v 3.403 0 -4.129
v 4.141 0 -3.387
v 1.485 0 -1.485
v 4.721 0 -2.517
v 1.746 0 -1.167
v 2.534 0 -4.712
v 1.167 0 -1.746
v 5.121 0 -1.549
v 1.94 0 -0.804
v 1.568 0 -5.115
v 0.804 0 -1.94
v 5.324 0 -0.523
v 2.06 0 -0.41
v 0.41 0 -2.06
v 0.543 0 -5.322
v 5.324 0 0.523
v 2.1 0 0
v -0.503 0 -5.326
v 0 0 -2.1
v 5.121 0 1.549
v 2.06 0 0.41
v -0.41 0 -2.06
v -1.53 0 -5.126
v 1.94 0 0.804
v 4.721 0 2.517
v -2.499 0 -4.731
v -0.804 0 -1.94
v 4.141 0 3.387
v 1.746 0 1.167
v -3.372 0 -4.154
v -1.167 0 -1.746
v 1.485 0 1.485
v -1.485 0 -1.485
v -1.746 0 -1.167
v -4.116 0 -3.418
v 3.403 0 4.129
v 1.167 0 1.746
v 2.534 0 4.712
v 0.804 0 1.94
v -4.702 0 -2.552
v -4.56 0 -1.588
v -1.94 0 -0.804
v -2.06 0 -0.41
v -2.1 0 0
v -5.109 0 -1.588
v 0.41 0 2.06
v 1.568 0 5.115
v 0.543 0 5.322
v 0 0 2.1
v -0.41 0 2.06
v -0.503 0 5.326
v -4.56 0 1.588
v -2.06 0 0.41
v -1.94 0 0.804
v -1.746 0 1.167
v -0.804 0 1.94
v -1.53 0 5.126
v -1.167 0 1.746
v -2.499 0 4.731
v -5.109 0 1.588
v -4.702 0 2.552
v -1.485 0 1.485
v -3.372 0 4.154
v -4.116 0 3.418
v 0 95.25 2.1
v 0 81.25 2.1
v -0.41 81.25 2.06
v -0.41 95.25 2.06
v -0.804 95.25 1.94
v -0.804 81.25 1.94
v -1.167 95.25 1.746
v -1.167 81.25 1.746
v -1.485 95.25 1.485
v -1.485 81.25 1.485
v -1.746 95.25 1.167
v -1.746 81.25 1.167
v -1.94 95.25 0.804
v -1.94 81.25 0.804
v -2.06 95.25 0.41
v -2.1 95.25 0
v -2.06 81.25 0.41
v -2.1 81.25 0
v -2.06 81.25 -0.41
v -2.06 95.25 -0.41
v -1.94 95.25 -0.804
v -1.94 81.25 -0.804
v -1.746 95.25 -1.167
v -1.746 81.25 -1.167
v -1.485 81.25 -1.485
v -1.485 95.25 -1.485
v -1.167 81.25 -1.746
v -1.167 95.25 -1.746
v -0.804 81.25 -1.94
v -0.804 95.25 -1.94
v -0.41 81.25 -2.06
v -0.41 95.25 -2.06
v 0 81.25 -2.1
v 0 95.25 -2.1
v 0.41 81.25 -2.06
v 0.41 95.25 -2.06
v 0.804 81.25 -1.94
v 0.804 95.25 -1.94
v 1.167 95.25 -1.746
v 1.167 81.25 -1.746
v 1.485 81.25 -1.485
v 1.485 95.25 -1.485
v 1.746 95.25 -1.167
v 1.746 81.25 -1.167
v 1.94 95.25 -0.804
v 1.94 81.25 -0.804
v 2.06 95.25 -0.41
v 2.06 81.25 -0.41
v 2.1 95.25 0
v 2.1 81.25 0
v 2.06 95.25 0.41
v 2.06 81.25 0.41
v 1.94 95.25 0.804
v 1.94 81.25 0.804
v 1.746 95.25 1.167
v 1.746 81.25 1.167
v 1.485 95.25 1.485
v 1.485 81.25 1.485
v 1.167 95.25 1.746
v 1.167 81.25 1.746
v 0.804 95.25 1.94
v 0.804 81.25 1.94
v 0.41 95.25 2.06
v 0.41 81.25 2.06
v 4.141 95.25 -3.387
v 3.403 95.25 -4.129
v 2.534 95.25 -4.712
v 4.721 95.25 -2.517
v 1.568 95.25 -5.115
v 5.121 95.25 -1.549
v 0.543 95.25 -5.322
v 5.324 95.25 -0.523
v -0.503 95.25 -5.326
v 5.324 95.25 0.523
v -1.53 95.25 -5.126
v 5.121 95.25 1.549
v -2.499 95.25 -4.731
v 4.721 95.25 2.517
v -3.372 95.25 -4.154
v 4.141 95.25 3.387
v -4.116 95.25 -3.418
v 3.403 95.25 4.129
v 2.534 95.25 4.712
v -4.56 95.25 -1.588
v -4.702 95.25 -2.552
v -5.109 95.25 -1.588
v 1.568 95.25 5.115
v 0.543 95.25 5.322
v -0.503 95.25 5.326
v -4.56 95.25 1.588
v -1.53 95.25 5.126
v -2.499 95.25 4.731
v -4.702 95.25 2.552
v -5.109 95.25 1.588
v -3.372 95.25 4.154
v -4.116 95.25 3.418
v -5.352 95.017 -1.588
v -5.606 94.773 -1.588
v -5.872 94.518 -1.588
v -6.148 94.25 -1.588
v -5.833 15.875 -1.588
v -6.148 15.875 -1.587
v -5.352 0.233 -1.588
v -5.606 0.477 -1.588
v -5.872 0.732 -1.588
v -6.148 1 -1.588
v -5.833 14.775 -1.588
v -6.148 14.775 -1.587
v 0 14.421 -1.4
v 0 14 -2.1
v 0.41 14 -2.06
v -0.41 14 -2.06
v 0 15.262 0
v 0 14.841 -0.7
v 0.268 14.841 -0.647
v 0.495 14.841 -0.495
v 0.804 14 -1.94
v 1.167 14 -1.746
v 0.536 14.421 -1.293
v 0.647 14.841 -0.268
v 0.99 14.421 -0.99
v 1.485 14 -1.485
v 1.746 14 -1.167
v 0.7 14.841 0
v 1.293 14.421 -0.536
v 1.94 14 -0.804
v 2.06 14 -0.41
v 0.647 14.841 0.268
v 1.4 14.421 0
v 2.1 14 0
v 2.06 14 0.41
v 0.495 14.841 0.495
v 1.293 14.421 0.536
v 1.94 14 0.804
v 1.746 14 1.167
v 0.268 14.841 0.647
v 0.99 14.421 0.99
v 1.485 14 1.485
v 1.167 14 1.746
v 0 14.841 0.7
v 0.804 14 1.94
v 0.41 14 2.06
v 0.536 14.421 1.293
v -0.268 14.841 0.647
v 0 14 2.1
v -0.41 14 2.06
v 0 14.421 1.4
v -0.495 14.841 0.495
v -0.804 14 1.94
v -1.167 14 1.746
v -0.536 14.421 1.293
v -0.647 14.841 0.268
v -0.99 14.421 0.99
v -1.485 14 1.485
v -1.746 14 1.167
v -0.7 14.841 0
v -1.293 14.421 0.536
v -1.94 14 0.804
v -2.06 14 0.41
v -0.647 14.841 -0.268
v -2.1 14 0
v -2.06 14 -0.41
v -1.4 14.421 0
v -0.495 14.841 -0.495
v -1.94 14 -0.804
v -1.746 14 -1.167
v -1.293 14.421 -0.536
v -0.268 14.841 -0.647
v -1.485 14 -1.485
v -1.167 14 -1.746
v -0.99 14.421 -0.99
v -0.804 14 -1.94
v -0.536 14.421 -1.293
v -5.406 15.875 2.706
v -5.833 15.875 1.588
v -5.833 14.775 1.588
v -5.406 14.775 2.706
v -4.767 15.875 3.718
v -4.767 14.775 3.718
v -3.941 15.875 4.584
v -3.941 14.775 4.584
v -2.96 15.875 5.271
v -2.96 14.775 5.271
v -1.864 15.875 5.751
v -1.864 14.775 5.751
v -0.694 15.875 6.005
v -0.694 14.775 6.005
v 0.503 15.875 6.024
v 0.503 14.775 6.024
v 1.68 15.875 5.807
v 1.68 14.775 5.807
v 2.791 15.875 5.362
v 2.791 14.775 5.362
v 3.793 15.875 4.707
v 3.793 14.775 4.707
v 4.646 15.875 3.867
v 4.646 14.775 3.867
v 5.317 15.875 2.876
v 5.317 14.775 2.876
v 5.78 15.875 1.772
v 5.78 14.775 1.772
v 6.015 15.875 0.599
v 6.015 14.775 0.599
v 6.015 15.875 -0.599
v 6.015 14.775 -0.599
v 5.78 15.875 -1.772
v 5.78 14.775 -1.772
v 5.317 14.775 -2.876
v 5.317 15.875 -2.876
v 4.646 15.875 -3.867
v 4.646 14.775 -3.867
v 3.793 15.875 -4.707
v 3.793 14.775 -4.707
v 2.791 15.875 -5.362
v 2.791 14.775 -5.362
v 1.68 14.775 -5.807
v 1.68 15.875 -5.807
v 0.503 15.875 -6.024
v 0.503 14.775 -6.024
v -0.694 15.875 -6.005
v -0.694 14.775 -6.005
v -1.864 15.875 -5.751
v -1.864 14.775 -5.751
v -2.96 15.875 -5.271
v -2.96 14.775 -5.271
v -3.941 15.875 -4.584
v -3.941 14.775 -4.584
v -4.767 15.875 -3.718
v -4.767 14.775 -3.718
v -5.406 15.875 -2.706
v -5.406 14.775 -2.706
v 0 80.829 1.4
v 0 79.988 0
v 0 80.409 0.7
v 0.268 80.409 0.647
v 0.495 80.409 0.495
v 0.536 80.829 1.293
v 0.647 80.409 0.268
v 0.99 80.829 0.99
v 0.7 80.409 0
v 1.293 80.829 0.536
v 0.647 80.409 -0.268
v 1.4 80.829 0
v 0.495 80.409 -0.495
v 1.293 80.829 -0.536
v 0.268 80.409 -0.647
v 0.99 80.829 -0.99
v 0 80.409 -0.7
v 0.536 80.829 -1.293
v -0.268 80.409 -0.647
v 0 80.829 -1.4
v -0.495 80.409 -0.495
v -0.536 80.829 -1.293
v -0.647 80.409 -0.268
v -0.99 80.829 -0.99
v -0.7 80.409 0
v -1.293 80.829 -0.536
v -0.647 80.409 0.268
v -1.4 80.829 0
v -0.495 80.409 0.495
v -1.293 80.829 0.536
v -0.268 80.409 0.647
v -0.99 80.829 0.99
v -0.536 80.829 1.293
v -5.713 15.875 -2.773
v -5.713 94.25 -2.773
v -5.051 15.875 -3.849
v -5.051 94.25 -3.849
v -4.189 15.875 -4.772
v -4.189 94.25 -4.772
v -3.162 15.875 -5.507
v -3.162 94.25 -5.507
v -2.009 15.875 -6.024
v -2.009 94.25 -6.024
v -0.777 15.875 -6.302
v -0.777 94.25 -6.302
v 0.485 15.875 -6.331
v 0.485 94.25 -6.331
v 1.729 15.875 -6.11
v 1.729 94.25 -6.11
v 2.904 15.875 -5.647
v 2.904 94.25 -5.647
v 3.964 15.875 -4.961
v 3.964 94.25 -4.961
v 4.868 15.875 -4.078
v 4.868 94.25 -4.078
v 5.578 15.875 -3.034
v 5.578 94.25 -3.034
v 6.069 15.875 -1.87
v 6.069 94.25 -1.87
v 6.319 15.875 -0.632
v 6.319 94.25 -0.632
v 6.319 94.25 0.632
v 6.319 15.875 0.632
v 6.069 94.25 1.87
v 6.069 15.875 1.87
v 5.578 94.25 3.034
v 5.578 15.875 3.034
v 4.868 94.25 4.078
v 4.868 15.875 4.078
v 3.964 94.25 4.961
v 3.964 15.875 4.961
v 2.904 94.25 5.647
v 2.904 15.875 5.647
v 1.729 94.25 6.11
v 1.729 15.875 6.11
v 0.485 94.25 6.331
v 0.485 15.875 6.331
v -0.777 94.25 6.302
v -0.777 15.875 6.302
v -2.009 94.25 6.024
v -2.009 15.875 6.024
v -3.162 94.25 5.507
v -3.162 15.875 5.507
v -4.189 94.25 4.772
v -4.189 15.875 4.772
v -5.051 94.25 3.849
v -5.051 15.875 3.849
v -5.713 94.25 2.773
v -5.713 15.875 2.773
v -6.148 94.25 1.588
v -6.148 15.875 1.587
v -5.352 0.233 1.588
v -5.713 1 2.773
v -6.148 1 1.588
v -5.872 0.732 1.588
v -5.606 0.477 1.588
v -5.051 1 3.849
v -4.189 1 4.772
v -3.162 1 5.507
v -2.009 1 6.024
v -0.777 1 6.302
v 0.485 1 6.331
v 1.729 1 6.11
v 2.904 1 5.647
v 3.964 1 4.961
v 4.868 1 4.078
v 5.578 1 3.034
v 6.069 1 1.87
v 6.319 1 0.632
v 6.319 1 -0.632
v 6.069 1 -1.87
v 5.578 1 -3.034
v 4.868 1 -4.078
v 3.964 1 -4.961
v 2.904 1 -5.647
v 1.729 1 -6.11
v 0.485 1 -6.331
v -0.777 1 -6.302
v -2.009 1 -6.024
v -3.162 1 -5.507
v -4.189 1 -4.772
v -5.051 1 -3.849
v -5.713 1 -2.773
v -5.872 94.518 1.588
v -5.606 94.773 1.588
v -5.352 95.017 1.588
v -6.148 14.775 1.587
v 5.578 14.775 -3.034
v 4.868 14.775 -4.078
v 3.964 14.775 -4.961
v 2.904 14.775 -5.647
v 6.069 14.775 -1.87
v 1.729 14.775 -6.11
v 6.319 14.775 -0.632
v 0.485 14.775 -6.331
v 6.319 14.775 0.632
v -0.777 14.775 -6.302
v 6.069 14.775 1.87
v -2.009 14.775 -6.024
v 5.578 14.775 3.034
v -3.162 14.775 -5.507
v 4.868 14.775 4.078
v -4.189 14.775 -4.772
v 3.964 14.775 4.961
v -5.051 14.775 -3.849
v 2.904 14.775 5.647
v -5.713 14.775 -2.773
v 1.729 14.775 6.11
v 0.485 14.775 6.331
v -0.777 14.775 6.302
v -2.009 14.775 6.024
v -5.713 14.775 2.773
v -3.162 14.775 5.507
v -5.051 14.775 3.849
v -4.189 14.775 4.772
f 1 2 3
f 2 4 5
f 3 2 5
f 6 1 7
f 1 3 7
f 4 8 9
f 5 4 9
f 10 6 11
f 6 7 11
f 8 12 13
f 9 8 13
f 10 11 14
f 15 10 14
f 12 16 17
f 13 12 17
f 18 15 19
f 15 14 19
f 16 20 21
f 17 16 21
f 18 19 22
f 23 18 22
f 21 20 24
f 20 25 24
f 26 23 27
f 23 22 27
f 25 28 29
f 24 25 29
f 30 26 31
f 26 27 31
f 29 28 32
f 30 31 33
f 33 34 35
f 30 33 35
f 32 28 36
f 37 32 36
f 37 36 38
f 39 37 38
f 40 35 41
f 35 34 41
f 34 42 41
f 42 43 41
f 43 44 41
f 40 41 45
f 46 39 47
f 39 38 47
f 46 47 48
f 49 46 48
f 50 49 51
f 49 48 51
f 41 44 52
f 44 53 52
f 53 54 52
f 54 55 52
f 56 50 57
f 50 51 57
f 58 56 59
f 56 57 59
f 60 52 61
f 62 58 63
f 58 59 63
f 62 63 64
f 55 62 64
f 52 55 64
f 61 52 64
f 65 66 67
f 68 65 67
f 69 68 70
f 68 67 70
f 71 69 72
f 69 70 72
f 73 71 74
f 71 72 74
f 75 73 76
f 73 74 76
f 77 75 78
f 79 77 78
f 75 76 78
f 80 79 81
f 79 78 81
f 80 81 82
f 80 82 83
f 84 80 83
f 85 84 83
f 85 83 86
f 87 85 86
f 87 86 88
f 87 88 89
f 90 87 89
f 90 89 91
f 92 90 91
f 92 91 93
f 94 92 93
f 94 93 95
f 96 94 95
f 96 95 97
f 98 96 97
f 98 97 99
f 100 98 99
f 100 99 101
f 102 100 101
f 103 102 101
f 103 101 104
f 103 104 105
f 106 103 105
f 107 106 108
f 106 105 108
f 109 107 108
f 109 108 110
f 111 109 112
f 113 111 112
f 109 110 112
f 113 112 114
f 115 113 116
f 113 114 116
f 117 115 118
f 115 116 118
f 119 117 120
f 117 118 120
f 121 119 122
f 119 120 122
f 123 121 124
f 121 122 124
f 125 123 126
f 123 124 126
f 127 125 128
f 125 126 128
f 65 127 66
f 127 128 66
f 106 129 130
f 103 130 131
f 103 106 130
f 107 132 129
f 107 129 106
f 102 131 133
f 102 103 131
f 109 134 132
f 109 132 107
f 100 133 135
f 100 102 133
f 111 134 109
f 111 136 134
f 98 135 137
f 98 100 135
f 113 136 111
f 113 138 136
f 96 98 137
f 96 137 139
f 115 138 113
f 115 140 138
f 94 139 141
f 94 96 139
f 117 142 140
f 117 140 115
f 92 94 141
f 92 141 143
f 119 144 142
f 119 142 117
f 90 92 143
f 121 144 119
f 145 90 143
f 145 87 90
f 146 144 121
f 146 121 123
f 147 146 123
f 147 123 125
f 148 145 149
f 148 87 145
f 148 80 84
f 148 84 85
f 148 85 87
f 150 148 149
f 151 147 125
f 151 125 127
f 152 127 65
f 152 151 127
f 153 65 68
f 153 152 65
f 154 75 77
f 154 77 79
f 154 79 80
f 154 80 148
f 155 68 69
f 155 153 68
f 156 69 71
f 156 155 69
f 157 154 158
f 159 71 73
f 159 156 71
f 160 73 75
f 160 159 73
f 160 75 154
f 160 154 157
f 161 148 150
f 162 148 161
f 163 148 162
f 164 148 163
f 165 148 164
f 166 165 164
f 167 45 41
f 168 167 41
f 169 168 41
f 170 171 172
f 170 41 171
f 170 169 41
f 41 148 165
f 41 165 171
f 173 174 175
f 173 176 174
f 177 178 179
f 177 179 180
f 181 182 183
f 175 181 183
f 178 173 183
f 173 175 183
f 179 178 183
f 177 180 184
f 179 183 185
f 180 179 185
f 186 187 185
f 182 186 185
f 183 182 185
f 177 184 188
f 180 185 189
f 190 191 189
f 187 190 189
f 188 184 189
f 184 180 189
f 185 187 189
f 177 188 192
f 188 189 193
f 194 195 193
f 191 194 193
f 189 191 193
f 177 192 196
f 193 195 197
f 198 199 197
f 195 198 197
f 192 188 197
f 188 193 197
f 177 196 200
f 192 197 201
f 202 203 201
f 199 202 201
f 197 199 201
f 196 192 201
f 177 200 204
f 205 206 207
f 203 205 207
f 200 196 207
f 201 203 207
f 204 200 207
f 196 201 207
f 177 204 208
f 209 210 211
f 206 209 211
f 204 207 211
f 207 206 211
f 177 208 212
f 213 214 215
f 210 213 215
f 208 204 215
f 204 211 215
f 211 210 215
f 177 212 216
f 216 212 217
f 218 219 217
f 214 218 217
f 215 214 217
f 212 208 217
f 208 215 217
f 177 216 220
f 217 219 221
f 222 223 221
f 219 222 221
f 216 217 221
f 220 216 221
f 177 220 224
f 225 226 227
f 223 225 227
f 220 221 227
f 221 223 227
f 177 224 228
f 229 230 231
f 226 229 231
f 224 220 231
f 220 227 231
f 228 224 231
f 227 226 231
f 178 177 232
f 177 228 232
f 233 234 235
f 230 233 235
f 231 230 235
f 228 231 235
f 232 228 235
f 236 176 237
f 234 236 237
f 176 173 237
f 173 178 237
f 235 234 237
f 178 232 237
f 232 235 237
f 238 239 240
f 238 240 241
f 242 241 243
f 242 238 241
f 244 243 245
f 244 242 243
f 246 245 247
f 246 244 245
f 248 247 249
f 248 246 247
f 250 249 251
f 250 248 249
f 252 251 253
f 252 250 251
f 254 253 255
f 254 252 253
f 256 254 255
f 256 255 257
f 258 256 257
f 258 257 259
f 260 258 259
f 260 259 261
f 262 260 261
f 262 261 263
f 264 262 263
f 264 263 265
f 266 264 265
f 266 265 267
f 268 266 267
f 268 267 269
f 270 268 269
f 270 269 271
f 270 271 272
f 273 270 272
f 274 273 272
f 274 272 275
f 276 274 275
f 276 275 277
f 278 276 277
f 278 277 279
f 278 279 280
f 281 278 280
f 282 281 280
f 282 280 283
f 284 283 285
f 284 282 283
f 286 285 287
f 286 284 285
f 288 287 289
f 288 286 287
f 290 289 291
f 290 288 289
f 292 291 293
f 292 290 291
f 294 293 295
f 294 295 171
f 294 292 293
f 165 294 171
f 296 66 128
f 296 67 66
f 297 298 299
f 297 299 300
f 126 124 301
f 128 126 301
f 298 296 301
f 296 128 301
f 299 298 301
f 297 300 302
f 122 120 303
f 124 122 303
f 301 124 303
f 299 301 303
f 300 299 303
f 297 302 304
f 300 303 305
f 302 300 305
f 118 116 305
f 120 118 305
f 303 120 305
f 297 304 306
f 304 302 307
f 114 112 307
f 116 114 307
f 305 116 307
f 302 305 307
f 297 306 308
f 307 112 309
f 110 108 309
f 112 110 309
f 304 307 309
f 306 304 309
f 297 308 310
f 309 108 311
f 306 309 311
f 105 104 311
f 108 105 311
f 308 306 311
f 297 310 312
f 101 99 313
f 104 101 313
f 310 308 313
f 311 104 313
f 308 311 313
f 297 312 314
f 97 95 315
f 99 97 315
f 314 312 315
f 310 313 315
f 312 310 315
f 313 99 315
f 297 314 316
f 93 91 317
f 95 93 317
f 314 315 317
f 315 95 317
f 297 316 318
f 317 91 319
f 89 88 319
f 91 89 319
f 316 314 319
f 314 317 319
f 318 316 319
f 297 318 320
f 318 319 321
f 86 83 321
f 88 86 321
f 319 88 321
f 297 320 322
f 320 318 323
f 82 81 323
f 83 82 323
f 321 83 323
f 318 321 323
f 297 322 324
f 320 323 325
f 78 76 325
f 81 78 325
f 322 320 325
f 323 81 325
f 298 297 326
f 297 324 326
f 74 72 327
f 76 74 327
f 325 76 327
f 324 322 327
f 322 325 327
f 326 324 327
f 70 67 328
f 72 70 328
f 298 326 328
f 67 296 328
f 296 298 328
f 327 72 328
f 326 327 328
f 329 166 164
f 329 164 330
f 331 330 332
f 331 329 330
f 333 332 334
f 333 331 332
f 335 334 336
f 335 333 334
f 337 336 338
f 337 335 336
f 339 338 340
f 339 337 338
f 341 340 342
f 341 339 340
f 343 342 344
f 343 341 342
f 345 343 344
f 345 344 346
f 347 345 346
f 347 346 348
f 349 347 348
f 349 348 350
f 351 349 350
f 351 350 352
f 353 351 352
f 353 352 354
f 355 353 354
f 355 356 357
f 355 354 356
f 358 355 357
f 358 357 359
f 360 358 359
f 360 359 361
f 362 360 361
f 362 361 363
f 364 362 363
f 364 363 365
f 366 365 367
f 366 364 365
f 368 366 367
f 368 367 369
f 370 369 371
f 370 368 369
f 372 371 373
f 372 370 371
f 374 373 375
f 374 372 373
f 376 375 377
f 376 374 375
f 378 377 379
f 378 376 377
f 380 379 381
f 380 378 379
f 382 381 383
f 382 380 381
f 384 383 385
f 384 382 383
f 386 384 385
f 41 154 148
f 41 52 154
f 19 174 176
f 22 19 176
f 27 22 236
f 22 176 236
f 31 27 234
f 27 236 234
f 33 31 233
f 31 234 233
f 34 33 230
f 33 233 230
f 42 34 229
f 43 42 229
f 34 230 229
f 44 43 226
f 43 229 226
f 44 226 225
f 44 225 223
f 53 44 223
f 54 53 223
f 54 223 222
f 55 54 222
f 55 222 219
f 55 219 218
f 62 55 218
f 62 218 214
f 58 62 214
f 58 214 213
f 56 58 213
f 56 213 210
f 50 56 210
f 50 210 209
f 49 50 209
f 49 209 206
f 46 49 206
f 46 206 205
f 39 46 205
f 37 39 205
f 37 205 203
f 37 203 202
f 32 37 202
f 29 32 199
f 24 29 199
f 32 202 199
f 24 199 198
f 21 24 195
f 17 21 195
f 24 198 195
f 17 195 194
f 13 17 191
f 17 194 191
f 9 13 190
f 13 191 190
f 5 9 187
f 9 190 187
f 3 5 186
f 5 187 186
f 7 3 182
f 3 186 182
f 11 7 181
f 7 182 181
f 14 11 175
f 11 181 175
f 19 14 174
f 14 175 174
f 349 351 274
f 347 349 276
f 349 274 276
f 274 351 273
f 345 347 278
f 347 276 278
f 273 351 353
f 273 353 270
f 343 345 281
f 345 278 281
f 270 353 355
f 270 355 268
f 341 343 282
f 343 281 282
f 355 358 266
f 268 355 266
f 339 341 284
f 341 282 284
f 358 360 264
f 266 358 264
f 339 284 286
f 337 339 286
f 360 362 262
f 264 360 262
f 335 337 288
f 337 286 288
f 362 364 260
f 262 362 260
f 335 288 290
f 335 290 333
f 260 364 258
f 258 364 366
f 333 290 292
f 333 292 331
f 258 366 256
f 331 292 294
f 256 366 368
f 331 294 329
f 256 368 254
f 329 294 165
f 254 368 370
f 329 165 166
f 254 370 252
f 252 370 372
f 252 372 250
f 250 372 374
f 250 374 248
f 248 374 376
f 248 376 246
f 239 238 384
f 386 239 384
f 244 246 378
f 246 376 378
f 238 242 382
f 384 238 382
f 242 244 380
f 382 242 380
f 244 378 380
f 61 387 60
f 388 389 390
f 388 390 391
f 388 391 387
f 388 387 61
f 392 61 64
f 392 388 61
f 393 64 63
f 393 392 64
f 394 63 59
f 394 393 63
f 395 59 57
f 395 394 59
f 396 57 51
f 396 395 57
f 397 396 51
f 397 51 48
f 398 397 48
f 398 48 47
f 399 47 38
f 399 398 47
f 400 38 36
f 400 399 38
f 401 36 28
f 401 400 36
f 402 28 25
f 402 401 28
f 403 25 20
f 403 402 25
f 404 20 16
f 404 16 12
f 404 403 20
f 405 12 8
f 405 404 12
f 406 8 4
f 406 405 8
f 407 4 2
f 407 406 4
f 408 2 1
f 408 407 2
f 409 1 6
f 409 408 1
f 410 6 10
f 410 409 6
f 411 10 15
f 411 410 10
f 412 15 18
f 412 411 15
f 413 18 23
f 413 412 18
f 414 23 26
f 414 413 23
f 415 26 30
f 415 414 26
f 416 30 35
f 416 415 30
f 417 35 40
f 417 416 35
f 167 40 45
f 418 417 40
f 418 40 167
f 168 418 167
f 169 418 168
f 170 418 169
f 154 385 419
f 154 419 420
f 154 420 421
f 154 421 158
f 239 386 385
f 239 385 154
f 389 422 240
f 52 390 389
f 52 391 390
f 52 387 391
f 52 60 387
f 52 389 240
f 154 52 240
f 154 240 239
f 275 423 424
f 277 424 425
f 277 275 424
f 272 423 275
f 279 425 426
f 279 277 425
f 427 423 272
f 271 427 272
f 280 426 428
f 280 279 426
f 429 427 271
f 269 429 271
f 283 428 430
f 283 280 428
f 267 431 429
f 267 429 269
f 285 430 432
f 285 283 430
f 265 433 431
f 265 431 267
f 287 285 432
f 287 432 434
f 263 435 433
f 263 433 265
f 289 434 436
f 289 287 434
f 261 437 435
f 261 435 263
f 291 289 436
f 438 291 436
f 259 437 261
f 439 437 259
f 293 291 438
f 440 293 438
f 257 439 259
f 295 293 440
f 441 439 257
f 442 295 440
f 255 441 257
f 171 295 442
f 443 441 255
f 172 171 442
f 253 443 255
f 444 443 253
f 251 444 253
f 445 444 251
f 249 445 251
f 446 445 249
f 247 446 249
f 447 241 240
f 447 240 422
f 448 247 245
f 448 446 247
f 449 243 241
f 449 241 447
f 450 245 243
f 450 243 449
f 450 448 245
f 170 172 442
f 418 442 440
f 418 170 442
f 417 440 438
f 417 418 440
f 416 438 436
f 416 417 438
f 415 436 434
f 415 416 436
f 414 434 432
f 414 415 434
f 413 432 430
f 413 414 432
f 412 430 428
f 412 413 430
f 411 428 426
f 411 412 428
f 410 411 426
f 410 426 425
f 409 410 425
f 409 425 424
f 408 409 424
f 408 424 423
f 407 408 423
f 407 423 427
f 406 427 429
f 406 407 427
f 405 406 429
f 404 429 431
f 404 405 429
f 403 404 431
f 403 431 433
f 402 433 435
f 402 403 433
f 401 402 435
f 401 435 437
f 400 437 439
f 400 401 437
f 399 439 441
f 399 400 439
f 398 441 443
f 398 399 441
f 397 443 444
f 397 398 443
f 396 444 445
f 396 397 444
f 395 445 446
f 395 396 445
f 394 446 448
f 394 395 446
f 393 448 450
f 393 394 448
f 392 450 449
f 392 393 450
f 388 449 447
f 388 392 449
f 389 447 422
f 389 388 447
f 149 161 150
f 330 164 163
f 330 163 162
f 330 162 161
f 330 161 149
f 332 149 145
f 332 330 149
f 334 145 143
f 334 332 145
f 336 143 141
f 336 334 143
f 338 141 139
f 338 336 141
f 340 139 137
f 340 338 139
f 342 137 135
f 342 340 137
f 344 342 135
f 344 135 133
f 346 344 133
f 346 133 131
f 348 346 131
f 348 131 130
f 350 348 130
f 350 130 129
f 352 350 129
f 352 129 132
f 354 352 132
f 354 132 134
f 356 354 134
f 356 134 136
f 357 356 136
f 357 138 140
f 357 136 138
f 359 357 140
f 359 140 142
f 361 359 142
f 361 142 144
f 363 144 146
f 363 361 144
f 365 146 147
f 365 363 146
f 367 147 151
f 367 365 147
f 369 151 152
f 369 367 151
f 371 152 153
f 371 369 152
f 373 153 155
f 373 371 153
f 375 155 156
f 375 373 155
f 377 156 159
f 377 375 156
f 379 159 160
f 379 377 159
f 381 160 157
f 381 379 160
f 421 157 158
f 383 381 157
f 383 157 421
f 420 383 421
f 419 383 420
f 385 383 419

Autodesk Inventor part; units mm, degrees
ref_plane "YZ Plane" through (0, 0, 0) normal (1, 0, 0) x (0, 1, 0)
ref_plane "XZ Plane" through (0, 0, 0) normal (0, 1, 0) x (-1, 0, 0)
ref_plane "XY Plane" through (0, 0, 0) normal (0, 0, 1) x (1, 0, 0)
sketch "Sketch1" plane through (0, 0, 0) normal (0, 1, 0) x (-1, 0, 0)
  arc A0 (6.1484, 1.5875) -> (6.1484, -1.5875) centre (0, 0) ccw
  line L0 (6.1484, 1.5875) -> (4.5604, 1.5875)
  line L1 (4.5604, 1.5875) -> (4.5604, -1.5875)
  line L2 (4.5604, -1.5875) -> (6.1484, -1.5875)
  line L3 (4.5604, 0) -> (0, 0) construction
  dimension "d0" = 12.7
  dimension "d1" = 3.175
  dimension "d2" = 1.588
extrude "Extrusion1" add sketch "Sketch1" along normal blind 95.25
chamfer "Chamfer1" distance 1 angle 45 2 edges at (6.35, 0, 0) (6.35, 95.25, 0)
hole "Hole1" at (0, 0, 0) direction (0, 1, 0) diameter 4.2 depth 14 tip angle 118
hole "Hole2" at (0, 95.25, 0) direction (0, -1, 0) diameter 4.2 depth 14 tip angle 118
sketch "Sketch2" plane through (0, 0, 0) normal (0, 0, 1) x (1, 0, 0)
  line L0 (0, 0) -> (0, 95.25) construction
  line L1 (-2.1, 95.25) -> (2.1, 95.25) construction
  line L2 (-6.35, 14.775) -> (-6.0452, 14.775)
  line L3 (-6.0452, 14.775) -> (-6.0452, 15.875)
  line L4 (-6.0452, 15.875) -> (-6.35, 15.875)
  line L5 (-6.35, 15.875) -> (-6.35, 14.775)
  dimension "d30" = 1.1
  dimension "d32" = 6.35
  dimension "d33" = 79.375
  dimension "d38" = 6.0452
revolve "Revolution1" cut sketch "Sketch2" angle 360 about axis through (0, 0, 0) along (0, 1, 0)
properties part number "Drum_Axle" material "Steel, High Strength, Low Alloy"
